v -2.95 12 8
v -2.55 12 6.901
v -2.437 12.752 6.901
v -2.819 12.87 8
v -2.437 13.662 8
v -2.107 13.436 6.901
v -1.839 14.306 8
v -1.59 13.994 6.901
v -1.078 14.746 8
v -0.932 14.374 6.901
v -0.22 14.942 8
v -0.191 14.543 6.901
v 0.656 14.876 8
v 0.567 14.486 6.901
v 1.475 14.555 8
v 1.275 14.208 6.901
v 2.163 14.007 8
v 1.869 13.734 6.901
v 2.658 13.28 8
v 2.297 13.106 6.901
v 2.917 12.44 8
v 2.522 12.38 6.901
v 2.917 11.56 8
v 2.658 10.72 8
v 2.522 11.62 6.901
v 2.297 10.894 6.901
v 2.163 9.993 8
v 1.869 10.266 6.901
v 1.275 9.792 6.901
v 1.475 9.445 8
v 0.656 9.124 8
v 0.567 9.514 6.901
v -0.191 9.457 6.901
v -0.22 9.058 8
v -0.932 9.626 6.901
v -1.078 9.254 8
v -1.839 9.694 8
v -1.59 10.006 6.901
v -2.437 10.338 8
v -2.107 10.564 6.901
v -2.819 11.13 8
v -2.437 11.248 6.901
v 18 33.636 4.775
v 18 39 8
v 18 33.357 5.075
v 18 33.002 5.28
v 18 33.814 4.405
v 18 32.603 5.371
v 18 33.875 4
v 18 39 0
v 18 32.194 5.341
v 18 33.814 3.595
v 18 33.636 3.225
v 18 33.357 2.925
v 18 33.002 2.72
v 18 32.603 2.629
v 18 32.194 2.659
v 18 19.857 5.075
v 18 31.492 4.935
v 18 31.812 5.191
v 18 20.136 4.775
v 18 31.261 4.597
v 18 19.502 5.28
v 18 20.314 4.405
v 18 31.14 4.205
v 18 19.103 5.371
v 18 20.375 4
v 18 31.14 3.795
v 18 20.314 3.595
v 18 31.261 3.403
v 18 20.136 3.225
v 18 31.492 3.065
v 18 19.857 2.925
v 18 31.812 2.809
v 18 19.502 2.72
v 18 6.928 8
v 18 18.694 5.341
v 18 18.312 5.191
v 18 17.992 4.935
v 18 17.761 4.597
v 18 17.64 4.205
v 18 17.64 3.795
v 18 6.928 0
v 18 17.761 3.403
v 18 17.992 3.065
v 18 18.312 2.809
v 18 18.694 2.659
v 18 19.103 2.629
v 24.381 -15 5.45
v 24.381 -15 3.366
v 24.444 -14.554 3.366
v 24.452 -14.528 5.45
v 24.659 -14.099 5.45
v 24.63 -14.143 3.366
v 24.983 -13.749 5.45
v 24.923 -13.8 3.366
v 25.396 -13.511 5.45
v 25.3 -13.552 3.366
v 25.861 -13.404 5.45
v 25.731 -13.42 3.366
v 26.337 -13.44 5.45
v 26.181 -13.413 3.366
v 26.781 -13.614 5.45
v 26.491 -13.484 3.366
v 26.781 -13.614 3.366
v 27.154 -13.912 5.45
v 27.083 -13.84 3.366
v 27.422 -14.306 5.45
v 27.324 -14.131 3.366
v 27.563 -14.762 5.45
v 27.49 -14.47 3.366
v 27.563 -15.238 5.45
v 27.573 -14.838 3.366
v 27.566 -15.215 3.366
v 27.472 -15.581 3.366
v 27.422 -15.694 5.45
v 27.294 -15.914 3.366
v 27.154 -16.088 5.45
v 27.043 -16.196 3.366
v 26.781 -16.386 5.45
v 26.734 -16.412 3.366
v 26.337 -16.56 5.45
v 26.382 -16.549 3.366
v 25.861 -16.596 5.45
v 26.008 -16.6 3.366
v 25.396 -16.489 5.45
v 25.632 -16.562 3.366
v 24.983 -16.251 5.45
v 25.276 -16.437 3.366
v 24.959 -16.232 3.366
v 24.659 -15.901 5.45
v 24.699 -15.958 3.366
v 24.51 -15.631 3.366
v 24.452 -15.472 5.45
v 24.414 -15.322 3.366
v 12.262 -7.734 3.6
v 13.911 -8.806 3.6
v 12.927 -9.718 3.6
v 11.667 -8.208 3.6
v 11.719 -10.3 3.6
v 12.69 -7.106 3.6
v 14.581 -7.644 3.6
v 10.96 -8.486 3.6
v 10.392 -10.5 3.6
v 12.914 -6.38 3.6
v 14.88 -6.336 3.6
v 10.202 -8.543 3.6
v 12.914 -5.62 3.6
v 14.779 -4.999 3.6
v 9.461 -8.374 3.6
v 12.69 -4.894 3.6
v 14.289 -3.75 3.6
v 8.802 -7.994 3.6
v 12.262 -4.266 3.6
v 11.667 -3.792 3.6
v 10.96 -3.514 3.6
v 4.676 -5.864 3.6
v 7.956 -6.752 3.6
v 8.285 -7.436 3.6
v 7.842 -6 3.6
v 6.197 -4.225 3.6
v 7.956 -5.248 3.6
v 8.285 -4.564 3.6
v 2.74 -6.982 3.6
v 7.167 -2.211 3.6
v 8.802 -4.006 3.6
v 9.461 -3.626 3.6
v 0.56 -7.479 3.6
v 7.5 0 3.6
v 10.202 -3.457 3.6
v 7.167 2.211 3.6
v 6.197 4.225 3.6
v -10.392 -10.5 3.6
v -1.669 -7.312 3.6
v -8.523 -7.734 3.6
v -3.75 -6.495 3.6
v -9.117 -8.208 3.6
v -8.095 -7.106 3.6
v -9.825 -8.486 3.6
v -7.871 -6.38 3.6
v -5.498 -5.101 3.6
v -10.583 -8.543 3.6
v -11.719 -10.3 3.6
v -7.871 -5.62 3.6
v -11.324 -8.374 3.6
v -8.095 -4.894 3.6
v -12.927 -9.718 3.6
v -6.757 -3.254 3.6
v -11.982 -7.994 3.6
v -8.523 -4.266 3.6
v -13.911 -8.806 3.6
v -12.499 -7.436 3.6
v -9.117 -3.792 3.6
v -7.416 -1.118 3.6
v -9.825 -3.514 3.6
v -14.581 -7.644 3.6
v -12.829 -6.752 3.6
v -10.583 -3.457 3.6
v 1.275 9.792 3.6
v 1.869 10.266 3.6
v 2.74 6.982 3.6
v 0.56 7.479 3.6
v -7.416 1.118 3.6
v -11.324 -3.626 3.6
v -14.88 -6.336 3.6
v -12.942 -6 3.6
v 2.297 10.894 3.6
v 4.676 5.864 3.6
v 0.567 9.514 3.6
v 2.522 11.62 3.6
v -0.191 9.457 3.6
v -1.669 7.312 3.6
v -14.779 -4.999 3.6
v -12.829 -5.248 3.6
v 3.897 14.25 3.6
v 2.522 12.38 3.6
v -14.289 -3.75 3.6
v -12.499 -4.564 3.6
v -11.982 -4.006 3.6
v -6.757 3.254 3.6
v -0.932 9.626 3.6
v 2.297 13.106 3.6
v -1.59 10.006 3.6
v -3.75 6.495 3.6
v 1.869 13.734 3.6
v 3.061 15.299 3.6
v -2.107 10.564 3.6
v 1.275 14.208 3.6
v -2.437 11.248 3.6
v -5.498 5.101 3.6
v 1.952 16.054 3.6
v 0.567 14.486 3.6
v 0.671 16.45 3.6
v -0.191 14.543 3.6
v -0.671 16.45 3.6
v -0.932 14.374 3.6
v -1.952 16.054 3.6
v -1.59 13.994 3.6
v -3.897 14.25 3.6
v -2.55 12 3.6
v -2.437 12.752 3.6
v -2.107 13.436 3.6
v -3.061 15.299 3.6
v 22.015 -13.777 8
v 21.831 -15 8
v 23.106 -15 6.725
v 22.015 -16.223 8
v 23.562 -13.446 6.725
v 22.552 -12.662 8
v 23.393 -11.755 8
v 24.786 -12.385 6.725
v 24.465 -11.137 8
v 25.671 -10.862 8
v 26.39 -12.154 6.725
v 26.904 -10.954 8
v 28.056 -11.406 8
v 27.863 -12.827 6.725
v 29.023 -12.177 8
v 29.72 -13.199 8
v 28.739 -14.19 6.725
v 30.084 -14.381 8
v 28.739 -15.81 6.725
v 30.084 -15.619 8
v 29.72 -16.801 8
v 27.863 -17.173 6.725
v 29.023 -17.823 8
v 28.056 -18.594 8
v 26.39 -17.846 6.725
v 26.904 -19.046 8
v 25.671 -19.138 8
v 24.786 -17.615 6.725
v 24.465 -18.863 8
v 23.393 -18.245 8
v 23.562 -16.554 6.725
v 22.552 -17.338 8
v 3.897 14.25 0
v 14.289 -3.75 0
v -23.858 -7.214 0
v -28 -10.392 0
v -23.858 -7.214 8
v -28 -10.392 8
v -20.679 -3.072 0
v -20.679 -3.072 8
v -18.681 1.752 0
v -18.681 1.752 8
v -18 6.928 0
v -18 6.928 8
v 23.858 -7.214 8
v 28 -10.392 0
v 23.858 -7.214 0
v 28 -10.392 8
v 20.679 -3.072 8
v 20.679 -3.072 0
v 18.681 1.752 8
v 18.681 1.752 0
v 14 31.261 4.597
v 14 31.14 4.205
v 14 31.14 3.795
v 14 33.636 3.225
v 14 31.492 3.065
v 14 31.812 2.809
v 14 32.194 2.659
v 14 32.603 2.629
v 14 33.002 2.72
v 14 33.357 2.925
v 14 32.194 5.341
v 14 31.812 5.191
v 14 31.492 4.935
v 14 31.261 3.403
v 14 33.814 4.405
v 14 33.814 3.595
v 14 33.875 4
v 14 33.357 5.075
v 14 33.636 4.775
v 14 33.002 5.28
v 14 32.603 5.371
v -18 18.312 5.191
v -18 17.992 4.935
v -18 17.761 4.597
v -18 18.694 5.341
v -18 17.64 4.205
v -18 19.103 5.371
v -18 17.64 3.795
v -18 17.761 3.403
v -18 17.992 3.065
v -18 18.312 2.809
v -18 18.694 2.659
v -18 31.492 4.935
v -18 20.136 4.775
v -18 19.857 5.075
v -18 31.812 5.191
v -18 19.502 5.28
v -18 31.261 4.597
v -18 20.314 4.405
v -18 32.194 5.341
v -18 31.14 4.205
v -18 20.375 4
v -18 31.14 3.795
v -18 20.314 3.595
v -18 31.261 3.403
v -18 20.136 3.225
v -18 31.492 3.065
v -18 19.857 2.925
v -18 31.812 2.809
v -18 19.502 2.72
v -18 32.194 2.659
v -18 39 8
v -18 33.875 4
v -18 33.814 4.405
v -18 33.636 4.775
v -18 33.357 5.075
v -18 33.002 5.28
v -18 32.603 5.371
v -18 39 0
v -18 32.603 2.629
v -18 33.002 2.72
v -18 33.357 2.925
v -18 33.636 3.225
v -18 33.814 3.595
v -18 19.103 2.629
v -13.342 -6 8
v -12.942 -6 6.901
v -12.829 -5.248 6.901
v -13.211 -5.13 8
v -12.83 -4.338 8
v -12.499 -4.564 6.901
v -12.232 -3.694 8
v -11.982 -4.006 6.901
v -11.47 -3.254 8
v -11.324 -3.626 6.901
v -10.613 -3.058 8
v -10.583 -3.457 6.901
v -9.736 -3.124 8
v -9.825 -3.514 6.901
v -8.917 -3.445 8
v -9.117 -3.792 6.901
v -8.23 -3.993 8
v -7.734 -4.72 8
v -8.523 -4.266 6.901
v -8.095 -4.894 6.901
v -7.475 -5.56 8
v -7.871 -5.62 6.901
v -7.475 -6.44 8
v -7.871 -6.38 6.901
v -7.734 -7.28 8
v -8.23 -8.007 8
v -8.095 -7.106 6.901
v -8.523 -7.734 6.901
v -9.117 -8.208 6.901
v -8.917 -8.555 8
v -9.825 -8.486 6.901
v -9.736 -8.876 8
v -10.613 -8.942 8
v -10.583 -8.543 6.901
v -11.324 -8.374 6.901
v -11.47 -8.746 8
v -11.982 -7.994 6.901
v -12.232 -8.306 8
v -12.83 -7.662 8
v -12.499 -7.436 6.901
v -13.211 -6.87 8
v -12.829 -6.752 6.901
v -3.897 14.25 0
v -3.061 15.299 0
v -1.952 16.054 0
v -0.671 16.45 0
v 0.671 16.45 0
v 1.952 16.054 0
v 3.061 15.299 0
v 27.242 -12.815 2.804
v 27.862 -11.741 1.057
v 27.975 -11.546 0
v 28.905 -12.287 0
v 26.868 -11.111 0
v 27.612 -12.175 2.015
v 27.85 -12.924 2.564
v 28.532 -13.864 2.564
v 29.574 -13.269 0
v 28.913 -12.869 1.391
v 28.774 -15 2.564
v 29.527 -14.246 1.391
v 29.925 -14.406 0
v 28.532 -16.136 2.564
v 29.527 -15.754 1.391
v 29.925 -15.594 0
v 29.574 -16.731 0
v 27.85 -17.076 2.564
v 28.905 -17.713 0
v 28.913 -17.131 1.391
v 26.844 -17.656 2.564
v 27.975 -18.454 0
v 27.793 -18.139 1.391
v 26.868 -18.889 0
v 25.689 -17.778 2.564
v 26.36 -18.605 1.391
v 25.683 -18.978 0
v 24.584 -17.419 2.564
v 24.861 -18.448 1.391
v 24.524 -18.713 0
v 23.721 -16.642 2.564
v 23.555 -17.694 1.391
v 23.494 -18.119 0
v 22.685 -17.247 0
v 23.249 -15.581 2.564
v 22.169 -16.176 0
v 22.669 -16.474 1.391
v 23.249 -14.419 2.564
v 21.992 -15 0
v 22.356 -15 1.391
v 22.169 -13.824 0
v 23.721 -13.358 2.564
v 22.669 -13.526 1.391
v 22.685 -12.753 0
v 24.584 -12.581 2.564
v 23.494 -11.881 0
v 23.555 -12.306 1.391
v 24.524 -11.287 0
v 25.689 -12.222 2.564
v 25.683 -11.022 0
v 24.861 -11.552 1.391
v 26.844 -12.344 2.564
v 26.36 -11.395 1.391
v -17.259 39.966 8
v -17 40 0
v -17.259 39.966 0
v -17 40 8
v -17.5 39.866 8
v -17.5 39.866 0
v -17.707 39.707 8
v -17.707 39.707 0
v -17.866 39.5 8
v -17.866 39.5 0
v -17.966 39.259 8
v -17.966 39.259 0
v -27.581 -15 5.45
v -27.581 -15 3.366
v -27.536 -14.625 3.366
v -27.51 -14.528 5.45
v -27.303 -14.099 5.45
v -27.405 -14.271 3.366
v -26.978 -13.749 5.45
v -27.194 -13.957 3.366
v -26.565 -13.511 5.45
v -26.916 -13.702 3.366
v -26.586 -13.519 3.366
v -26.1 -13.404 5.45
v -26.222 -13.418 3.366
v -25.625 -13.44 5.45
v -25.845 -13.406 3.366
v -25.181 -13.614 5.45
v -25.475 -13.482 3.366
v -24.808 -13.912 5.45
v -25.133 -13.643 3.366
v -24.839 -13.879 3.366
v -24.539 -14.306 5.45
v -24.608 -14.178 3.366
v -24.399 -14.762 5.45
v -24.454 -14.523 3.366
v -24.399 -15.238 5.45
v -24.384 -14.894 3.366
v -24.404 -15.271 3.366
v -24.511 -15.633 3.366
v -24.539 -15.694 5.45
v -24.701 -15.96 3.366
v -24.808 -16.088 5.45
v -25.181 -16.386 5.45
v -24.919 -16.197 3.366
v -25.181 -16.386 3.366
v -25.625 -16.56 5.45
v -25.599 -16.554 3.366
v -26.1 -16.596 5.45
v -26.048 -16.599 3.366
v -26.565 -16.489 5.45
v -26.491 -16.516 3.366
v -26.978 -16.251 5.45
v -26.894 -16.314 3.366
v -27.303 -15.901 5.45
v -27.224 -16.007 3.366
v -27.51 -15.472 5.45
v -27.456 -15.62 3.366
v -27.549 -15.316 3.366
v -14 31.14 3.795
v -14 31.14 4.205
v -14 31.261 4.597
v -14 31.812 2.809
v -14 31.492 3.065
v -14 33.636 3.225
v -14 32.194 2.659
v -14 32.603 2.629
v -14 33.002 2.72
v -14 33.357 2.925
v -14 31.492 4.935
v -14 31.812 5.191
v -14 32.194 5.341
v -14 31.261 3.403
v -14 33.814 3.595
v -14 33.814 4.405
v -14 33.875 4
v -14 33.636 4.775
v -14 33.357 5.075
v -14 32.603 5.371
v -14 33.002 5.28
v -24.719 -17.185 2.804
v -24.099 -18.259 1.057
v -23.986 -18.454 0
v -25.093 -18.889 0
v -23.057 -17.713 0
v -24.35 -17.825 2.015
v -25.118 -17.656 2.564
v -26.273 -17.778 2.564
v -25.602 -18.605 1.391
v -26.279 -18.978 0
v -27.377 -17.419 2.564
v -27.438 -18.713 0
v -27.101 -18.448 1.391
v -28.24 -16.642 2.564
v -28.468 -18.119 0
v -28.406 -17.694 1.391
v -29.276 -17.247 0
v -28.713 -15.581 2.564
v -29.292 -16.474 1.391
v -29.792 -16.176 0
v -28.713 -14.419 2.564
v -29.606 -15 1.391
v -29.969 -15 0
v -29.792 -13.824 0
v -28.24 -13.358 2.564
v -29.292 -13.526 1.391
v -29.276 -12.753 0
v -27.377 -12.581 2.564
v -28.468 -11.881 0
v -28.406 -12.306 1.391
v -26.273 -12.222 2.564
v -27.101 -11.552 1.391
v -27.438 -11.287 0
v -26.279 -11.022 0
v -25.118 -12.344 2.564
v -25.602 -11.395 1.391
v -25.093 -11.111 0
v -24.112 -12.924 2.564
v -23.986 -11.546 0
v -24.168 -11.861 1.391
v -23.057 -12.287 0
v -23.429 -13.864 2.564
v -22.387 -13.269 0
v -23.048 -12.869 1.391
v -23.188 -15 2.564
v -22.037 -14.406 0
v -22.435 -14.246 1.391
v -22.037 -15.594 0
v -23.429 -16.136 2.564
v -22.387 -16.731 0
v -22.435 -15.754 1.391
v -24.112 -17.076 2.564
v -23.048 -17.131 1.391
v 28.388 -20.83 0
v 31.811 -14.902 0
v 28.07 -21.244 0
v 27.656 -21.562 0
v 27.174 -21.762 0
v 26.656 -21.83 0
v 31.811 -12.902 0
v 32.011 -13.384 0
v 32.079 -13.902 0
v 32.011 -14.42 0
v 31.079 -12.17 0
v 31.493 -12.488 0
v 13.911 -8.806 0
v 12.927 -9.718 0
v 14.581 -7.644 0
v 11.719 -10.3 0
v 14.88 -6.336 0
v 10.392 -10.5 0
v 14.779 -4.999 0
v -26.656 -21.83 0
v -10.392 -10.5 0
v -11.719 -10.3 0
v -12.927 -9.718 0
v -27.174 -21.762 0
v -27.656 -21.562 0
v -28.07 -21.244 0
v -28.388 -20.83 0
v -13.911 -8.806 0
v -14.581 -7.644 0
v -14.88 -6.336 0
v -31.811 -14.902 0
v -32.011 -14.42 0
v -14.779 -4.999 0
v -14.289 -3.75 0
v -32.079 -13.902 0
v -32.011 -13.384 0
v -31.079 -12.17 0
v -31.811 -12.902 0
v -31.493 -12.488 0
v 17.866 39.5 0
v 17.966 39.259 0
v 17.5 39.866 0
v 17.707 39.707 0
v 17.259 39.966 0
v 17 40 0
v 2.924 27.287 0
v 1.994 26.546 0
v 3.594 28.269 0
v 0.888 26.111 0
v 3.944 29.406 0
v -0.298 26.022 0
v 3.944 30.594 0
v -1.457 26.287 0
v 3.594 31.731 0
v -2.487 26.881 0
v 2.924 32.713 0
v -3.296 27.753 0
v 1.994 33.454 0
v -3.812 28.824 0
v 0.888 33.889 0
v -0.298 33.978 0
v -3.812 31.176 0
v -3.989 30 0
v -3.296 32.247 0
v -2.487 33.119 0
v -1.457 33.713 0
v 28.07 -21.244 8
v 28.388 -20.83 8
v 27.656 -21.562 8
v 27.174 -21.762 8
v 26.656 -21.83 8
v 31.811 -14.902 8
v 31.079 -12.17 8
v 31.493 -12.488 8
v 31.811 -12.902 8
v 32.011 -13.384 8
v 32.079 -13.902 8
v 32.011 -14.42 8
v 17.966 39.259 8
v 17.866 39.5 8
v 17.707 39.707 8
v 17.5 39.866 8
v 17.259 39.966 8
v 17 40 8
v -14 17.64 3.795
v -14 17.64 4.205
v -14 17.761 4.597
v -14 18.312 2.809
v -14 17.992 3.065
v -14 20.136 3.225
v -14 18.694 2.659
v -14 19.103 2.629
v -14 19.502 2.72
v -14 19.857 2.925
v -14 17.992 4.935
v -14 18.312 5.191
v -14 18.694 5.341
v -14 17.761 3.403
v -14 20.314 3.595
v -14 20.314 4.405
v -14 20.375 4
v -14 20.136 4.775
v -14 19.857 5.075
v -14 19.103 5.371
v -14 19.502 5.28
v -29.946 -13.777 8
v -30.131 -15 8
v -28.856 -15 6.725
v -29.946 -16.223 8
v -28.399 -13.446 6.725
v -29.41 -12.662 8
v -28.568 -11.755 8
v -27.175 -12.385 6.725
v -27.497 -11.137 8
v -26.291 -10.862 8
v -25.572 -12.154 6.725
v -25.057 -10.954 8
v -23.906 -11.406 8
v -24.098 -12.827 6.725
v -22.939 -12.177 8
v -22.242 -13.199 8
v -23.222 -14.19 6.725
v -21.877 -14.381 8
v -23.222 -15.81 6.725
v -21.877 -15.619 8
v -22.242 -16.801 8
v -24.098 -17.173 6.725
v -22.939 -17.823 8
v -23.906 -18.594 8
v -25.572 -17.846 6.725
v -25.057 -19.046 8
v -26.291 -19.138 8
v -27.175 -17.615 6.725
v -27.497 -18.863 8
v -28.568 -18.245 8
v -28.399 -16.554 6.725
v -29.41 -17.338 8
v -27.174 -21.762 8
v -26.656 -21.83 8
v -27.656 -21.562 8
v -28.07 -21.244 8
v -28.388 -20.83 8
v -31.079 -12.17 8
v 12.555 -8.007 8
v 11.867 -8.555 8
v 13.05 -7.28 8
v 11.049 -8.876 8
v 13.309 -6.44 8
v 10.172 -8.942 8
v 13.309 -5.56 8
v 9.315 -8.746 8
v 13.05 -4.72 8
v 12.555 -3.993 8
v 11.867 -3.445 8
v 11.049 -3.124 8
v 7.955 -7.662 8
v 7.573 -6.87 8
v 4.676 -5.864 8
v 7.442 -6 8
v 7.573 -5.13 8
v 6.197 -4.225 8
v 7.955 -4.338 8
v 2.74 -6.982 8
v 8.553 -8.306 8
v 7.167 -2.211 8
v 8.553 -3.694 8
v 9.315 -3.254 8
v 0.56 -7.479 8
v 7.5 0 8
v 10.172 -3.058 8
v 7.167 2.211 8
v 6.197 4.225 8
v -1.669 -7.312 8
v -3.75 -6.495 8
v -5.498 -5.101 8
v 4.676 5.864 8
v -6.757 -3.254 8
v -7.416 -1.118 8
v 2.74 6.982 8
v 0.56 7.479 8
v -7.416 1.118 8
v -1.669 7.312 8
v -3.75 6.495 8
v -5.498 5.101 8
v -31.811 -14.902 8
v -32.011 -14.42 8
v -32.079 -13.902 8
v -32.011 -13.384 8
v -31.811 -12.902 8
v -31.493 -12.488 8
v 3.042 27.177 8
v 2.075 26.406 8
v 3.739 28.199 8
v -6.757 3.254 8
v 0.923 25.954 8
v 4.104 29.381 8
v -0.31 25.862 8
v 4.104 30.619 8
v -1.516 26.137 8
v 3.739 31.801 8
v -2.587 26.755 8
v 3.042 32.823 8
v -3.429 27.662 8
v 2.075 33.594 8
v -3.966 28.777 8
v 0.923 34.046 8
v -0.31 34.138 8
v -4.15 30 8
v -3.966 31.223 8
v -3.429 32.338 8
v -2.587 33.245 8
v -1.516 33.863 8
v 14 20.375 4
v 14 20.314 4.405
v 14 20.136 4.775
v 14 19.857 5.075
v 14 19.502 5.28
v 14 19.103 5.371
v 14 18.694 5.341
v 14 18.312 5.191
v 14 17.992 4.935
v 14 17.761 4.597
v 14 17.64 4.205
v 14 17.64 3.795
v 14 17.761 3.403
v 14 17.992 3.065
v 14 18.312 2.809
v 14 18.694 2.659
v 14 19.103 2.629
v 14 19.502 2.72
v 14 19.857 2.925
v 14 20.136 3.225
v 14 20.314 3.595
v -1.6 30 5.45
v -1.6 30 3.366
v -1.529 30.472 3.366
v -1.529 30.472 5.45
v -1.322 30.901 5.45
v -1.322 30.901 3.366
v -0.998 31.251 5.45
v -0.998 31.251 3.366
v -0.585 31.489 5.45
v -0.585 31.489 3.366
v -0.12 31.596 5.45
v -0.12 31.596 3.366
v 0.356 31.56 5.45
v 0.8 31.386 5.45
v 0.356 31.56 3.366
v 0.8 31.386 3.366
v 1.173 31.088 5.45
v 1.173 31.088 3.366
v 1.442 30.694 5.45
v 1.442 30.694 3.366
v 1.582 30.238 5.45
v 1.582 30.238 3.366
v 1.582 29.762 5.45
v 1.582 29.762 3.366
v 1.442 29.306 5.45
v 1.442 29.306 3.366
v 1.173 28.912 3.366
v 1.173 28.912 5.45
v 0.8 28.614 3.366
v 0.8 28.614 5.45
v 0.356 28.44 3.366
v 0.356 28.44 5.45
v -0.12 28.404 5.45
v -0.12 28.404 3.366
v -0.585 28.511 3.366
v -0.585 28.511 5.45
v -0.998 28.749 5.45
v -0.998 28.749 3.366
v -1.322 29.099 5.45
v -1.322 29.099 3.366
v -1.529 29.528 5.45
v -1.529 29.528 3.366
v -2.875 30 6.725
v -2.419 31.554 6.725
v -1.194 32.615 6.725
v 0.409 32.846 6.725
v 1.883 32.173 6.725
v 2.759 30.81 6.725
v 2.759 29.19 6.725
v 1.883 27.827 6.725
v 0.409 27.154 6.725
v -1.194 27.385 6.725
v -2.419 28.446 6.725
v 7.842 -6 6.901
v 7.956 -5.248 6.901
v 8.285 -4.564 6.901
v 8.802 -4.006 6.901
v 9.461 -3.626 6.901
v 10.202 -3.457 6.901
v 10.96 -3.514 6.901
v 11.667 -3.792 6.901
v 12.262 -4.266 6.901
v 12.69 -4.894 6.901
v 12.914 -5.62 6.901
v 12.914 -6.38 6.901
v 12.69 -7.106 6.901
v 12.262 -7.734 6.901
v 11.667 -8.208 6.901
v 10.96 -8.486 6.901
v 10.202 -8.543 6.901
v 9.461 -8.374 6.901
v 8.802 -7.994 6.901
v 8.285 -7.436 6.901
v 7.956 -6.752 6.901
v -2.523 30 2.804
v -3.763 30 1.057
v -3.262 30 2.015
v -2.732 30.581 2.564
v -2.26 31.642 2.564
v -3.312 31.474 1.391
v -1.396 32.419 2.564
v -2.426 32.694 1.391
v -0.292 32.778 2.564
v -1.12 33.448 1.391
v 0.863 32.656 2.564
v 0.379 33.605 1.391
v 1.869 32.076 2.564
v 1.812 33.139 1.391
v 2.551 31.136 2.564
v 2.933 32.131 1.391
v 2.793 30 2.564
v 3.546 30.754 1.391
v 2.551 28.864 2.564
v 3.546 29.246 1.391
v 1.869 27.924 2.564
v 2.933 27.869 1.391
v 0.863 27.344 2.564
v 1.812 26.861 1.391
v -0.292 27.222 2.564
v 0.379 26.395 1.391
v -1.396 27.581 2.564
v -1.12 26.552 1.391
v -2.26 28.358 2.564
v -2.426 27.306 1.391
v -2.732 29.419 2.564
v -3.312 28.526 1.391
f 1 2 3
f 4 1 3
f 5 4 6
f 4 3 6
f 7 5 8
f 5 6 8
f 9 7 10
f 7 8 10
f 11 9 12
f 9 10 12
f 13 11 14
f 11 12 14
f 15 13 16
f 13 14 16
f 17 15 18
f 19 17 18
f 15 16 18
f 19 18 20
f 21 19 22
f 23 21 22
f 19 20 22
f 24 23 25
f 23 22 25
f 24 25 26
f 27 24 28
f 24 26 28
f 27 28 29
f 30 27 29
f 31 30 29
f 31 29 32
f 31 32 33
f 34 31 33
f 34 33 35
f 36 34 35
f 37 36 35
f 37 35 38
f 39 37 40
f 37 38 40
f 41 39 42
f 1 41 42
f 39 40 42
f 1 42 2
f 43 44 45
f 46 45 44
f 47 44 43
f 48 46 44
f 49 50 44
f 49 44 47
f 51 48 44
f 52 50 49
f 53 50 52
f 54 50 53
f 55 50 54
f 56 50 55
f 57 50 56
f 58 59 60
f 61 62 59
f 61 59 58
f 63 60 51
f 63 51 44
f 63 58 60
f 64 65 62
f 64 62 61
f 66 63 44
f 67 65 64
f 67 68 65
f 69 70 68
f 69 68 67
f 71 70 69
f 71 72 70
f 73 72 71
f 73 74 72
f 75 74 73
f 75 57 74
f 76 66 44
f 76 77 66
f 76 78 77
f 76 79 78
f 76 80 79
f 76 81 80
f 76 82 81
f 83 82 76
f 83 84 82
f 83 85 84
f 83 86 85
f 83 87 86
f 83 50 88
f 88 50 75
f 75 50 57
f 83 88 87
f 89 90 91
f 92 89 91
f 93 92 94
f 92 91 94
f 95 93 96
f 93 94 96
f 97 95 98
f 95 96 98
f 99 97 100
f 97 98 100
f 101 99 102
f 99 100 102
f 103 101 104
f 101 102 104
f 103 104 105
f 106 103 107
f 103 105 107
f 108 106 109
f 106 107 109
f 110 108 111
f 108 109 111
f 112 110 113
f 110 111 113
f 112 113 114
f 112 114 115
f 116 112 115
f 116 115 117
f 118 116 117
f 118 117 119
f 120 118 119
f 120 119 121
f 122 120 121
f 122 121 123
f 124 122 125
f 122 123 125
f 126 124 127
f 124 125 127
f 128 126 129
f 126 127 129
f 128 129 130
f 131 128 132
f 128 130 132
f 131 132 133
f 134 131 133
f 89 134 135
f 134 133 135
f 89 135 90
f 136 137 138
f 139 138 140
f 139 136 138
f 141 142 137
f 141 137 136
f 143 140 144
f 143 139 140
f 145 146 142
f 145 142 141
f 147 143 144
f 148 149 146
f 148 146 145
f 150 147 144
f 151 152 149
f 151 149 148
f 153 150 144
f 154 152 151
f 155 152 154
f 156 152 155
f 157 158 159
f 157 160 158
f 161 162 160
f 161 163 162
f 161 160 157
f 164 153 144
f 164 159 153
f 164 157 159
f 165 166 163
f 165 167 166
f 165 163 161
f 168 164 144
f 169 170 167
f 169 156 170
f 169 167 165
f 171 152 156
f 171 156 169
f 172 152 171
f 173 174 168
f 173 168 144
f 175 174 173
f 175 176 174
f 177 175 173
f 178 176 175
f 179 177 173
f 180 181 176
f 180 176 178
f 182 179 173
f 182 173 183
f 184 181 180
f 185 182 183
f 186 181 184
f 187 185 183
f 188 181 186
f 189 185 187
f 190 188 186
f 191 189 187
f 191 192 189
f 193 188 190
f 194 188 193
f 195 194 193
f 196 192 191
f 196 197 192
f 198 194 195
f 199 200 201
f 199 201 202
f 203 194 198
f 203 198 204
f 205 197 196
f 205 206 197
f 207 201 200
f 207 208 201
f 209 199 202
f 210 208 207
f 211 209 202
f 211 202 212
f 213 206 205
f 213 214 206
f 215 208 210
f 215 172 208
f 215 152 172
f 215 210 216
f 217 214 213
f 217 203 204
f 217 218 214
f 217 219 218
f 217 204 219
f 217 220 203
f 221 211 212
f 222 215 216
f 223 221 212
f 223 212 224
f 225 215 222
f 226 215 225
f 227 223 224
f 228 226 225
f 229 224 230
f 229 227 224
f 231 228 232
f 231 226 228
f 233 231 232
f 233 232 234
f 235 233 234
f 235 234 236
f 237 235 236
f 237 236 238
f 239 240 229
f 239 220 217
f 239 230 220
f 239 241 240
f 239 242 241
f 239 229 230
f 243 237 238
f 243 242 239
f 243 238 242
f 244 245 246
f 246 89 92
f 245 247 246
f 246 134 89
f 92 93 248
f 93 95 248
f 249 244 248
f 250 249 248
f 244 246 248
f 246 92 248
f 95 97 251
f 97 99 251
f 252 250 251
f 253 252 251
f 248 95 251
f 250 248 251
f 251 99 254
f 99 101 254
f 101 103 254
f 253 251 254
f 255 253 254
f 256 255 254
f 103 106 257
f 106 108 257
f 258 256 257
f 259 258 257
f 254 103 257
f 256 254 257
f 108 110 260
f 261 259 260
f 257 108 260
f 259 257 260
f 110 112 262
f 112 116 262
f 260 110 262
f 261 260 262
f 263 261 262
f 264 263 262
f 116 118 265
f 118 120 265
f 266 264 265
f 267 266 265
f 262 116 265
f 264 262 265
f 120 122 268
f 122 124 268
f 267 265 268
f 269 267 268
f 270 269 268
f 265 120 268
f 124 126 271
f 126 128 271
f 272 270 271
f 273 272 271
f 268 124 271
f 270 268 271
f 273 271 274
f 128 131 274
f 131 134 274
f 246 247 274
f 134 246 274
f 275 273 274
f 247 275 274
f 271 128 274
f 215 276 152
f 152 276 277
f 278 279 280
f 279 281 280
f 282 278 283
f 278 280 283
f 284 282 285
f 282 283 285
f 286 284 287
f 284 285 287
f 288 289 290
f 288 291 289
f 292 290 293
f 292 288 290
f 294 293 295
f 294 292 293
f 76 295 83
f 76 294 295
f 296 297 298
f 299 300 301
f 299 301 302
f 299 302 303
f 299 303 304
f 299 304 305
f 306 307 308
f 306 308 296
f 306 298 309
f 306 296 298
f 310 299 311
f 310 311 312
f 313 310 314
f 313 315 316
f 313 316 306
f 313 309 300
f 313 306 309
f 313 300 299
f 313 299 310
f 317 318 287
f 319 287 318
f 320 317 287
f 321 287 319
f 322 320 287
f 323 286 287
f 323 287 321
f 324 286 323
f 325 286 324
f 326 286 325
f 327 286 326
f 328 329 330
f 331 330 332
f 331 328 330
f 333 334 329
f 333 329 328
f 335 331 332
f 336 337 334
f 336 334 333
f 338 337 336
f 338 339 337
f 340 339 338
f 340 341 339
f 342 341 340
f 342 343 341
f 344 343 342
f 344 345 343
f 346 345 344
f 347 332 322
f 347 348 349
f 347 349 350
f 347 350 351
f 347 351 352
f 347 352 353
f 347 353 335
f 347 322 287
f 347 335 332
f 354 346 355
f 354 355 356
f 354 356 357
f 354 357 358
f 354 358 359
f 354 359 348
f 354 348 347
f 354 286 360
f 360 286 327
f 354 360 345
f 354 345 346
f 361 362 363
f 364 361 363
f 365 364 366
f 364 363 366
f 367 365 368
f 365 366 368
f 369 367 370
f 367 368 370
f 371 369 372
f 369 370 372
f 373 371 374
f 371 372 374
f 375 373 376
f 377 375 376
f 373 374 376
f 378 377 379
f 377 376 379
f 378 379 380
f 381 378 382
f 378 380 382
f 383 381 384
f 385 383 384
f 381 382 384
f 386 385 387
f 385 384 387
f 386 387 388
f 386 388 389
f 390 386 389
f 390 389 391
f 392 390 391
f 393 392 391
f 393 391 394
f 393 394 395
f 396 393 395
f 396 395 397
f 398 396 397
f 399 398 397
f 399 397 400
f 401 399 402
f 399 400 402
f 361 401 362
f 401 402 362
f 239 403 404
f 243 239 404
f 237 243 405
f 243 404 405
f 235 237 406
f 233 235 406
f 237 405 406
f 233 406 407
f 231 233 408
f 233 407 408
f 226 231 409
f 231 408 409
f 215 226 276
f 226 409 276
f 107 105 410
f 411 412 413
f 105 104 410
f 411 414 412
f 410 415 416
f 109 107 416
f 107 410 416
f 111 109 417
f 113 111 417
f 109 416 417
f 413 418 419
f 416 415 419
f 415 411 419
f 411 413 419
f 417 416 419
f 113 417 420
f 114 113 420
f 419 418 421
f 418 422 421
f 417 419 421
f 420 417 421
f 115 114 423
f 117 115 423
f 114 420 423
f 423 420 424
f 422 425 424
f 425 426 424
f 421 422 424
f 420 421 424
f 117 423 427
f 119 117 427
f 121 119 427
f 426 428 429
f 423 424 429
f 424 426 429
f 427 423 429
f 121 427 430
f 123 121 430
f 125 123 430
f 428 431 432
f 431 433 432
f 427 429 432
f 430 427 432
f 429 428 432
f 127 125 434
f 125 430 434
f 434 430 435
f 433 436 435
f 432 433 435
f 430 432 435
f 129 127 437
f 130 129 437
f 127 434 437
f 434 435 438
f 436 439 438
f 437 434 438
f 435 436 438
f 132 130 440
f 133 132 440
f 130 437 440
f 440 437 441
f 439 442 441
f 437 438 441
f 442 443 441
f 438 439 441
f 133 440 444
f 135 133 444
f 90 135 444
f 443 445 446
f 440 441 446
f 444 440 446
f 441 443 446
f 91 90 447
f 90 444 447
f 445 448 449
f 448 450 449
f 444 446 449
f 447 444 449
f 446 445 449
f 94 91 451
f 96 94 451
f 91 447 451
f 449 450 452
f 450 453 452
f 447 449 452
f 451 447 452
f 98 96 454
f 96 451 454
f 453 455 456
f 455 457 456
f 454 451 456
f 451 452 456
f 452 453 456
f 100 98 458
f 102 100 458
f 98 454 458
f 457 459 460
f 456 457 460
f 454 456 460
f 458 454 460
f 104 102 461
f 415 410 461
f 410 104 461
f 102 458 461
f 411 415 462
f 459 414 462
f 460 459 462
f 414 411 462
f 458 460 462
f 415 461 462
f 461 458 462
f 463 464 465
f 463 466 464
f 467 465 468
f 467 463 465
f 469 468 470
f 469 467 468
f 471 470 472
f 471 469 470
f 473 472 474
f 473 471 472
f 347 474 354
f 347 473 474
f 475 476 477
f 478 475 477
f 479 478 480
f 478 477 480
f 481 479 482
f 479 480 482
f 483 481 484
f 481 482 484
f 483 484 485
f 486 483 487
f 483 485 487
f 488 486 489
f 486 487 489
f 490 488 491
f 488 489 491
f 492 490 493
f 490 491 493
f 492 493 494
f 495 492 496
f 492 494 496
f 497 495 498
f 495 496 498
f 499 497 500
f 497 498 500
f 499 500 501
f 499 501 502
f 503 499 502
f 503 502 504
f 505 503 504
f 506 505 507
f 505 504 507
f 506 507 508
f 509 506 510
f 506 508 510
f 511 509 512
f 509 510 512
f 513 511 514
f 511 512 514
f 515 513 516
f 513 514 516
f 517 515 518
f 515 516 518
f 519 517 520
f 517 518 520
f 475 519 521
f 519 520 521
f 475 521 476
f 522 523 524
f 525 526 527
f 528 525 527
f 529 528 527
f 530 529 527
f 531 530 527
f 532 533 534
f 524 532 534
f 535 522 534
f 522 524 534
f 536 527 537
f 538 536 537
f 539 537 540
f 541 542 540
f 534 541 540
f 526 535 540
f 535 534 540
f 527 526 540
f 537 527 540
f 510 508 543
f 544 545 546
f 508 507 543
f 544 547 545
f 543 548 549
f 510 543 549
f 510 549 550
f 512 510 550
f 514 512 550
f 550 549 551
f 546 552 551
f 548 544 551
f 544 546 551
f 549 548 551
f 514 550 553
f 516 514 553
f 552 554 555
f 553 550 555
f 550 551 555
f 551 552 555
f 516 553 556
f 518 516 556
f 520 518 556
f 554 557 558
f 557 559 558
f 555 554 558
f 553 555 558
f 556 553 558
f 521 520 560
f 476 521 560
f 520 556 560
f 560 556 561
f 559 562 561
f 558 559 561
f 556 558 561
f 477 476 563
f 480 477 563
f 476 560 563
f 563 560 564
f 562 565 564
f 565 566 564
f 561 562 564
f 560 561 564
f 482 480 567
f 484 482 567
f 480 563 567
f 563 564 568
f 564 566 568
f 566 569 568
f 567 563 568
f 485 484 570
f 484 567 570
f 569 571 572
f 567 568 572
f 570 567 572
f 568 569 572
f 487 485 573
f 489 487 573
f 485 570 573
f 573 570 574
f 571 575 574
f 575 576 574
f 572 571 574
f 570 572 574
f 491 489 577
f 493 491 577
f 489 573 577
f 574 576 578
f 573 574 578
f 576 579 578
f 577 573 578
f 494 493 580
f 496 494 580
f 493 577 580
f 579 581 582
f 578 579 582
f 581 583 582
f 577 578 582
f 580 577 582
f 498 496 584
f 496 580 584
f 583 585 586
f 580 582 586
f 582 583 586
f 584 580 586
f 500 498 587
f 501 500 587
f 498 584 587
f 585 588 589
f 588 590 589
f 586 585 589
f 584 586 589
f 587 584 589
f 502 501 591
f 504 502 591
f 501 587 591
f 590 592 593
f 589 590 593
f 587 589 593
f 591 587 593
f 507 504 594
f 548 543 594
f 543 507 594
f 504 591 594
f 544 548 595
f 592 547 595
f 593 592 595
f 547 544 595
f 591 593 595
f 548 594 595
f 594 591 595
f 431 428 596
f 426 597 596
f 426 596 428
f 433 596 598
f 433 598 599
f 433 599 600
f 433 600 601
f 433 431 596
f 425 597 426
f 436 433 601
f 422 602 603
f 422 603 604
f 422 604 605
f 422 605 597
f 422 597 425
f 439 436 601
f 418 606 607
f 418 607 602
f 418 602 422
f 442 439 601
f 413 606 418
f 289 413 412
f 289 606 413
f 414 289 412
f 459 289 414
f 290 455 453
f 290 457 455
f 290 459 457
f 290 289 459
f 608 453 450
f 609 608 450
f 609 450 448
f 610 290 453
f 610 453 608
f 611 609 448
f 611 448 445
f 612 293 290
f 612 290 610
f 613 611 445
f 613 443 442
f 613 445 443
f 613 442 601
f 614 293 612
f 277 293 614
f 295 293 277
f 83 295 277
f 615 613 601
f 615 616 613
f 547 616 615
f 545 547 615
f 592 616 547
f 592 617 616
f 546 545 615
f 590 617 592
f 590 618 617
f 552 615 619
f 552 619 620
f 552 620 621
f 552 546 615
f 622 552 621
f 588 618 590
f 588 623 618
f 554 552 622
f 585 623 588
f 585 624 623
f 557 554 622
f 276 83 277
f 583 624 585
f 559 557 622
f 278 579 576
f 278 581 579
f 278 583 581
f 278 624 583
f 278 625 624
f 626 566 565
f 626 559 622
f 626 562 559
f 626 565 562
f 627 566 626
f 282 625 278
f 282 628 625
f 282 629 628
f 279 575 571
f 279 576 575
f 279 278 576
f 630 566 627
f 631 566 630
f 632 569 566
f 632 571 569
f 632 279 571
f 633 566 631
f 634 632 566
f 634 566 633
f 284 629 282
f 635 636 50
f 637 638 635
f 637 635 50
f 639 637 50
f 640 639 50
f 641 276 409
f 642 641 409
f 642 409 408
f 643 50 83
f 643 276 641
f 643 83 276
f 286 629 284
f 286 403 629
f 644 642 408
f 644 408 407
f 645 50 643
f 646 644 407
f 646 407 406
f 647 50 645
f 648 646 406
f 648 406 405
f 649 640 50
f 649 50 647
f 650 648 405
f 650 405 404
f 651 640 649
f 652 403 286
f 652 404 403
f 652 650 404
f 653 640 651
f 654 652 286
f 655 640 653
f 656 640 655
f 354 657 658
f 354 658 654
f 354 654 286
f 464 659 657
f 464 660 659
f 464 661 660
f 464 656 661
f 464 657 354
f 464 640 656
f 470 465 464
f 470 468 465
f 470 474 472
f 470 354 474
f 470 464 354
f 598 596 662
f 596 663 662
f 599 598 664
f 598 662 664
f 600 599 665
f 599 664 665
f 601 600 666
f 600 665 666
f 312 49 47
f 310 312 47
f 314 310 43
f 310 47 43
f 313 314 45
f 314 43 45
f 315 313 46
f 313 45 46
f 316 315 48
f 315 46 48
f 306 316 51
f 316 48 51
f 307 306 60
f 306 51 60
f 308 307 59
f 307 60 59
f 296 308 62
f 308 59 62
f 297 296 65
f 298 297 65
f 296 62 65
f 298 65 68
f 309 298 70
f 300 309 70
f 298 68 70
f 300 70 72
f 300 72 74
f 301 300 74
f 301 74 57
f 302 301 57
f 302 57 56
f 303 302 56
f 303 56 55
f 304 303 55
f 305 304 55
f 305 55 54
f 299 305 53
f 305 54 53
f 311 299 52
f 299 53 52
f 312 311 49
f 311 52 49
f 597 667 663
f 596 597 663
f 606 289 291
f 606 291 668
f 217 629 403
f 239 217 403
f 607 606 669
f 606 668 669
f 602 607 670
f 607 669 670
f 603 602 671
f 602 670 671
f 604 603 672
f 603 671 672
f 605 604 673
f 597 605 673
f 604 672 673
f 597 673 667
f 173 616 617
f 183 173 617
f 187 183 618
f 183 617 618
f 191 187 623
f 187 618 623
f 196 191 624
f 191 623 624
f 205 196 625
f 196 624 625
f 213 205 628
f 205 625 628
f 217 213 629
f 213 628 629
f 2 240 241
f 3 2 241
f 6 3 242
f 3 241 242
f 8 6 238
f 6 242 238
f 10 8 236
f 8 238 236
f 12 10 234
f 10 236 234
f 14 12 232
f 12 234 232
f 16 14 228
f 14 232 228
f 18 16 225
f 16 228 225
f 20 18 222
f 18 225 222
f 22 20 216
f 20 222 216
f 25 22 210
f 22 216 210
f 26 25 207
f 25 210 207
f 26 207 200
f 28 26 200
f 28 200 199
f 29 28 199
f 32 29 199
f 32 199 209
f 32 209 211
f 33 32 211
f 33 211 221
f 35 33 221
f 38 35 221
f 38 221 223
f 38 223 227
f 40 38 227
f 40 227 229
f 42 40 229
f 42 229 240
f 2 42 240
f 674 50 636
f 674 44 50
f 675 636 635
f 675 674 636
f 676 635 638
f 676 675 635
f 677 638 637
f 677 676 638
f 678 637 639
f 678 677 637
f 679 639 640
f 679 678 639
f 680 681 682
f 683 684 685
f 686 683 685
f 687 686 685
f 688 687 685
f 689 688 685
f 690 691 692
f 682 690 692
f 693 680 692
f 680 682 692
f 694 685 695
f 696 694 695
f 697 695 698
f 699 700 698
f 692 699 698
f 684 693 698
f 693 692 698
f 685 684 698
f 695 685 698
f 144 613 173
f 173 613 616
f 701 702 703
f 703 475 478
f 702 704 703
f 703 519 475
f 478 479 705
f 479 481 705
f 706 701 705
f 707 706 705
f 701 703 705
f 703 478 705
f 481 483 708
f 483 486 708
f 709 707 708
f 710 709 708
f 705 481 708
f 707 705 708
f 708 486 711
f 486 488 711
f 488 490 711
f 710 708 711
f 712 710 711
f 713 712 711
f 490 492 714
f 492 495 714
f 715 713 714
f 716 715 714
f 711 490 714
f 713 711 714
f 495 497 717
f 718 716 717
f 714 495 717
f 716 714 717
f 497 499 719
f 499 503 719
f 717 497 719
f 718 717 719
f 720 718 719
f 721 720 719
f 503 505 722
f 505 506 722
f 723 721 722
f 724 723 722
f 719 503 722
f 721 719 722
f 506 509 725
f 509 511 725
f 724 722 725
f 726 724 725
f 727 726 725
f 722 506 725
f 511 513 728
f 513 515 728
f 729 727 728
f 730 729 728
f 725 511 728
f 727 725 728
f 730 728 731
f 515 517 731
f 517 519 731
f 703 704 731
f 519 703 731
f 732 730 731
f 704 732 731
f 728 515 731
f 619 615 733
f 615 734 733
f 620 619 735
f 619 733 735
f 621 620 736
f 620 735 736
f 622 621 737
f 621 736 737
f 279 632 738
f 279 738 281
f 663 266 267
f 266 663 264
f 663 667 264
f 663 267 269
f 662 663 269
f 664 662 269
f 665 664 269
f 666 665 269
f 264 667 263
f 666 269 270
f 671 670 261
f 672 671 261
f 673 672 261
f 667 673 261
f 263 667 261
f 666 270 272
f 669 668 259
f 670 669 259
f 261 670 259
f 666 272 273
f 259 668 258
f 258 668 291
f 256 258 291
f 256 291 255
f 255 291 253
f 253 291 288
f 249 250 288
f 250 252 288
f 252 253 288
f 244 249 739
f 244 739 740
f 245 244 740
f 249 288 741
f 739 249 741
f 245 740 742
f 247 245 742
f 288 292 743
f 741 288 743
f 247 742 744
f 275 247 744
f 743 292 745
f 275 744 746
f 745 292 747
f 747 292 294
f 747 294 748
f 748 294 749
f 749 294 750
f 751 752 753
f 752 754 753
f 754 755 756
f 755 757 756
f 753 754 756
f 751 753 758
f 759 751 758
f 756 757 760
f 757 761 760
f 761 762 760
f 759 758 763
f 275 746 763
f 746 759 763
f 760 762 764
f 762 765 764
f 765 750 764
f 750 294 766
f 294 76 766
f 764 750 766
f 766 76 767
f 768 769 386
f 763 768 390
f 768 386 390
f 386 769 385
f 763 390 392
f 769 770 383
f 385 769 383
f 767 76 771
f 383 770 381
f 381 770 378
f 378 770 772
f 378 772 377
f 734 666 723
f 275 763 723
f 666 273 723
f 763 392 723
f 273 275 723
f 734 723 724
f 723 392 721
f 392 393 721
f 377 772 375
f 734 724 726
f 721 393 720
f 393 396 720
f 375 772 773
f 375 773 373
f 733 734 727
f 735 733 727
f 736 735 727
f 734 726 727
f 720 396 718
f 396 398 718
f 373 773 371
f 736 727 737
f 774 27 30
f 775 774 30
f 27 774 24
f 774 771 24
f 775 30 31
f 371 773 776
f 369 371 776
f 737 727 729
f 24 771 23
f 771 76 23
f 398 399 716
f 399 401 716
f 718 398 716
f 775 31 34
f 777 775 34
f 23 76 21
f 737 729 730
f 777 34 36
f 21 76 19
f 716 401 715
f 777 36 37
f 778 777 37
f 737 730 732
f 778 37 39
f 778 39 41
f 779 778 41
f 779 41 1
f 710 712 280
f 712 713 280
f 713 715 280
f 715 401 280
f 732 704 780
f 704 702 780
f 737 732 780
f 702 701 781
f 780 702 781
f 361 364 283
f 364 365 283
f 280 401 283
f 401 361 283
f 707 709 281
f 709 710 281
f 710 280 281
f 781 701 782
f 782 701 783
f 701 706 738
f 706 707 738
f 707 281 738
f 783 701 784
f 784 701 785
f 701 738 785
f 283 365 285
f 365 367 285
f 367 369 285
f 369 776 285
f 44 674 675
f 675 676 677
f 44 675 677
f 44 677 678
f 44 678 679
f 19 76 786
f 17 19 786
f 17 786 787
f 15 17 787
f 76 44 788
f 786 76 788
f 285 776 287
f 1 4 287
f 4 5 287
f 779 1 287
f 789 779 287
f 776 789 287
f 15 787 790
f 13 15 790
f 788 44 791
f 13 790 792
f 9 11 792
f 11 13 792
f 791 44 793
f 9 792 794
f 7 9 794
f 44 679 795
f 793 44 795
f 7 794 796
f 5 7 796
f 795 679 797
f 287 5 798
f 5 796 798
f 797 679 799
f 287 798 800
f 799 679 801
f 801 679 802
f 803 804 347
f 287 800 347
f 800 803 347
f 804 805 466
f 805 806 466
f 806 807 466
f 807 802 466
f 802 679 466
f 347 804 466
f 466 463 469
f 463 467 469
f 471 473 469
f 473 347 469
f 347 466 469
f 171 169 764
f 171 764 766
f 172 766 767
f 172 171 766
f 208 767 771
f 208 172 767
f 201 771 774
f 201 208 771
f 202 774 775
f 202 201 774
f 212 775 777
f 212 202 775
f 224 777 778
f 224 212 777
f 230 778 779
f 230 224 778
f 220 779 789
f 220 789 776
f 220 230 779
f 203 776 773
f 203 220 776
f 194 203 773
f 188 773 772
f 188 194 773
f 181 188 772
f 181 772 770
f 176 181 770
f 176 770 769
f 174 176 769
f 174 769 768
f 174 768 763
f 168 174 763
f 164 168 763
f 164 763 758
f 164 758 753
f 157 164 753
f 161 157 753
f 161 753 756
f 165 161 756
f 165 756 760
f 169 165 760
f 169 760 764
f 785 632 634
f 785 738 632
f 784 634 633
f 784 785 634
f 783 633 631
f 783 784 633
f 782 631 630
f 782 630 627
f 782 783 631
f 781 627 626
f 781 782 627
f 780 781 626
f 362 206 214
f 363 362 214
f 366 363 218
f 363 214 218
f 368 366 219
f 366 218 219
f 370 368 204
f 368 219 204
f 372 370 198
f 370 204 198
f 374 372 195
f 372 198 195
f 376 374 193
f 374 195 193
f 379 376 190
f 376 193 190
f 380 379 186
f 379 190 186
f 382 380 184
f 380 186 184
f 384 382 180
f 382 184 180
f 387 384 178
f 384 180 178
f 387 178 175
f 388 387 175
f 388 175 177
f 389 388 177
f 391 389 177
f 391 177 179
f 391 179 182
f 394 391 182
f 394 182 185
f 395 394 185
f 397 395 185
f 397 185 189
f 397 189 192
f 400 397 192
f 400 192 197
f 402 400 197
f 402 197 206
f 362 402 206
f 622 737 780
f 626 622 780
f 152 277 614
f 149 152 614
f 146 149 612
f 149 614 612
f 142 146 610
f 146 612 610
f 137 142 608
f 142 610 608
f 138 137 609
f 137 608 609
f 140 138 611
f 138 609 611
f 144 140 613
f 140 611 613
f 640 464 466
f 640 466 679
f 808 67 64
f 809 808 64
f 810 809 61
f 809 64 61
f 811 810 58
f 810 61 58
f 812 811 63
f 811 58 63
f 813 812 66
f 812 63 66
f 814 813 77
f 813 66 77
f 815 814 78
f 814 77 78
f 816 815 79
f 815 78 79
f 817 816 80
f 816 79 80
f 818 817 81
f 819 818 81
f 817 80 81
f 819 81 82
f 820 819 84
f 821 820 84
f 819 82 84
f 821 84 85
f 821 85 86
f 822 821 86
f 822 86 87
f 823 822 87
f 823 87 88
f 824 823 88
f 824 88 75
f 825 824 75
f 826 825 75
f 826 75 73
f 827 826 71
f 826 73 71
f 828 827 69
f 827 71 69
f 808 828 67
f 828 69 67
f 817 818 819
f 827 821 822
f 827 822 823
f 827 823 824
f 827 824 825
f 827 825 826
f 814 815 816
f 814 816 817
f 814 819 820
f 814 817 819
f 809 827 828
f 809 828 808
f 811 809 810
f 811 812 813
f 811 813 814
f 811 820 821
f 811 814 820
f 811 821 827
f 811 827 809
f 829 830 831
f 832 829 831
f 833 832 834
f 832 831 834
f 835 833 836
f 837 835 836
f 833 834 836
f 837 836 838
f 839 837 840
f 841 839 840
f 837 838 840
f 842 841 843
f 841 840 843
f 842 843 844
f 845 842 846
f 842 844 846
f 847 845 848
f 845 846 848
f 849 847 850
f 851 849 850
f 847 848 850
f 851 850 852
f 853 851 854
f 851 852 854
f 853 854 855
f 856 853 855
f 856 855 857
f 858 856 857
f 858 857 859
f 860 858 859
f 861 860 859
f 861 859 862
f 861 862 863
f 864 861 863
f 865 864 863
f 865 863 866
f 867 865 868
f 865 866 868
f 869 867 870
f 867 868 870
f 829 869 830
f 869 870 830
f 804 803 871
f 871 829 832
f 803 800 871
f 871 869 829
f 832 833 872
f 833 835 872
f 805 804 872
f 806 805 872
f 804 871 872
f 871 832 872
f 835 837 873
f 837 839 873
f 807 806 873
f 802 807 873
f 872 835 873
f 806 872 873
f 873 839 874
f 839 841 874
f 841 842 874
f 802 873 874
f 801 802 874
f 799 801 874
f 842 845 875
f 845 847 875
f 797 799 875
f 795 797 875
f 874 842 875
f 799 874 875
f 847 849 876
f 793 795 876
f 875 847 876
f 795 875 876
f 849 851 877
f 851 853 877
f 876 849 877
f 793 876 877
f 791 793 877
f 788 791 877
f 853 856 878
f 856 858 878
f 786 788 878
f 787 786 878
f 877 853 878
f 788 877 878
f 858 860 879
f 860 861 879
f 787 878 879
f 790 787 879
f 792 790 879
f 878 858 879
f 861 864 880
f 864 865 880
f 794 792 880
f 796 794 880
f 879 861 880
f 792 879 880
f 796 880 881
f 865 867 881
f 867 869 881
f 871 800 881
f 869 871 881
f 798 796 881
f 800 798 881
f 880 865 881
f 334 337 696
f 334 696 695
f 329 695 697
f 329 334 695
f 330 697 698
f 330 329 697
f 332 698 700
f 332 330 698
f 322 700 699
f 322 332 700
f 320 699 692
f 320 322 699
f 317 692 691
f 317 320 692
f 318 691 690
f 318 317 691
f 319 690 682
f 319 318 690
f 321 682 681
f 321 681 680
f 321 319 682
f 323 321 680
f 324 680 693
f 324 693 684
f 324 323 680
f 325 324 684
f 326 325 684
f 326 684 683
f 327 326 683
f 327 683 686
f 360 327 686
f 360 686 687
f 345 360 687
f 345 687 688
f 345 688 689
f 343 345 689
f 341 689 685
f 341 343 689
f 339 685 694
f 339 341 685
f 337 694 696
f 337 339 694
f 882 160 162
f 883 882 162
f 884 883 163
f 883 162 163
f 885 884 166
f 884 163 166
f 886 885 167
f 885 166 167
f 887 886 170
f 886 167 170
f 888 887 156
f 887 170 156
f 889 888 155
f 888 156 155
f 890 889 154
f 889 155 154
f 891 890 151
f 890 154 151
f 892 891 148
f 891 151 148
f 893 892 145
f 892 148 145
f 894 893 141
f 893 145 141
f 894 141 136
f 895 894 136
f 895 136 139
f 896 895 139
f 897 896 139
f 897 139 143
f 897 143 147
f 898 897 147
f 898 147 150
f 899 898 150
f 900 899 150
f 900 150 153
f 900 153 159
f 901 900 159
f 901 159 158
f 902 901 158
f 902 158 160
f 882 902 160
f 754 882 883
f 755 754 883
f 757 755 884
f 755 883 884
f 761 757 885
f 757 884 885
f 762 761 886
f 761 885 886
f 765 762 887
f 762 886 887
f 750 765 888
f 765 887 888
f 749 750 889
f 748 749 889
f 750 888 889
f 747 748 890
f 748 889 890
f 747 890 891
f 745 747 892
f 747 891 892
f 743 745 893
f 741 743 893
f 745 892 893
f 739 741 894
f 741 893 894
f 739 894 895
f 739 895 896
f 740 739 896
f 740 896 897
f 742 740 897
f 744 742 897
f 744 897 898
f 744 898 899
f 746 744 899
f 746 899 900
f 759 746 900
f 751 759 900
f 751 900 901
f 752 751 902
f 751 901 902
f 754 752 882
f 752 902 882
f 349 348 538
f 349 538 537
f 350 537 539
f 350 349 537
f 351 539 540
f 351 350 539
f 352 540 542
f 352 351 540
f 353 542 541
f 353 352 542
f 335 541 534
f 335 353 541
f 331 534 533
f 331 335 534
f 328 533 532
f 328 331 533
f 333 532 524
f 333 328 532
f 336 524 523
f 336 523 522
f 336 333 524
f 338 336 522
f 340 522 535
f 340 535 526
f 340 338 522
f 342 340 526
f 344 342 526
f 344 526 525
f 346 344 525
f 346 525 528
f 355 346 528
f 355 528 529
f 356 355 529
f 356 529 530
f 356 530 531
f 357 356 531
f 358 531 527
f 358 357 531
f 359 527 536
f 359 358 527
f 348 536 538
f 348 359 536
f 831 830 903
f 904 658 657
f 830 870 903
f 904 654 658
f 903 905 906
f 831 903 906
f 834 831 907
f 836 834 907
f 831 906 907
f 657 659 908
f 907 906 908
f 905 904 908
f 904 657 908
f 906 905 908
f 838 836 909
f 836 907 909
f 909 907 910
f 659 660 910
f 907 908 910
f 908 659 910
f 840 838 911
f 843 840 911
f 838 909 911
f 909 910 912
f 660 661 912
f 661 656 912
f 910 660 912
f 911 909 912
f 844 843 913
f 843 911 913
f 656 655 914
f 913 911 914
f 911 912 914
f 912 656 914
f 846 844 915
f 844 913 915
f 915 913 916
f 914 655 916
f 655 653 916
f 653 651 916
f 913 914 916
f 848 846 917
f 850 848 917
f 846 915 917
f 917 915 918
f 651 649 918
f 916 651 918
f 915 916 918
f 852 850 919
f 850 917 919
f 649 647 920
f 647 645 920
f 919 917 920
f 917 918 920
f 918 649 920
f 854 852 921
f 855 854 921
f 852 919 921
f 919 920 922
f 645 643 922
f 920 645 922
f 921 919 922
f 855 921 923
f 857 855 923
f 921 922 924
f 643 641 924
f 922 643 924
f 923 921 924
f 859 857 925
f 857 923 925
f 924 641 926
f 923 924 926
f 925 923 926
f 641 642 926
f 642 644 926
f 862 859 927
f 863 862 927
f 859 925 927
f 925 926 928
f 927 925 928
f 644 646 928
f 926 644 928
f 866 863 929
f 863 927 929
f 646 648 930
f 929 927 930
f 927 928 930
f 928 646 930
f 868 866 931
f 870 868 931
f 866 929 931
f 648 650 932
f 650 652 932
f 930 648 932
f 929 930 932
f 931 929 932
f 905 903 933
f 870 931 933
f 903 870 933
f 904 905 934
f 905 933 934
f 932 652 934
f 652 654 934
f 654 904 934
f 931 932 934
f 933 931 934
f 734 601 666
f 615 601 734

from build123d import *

# Parameters (mm, degrees)
SKETCH2_R                                       = 7.5
BOSS_EXTRUDE1_DEPTH                             = 8
CSK_FOR_M3_FLAT_HEAD_MACHINE_SCREW2_D           = 3.2
CSK_FOR_M3_FLAT_HEAD_MACHINE_SCREW2_CSINK_D     = 8.3
CSK_FOR_M3_FLAT_HEAD_MACHINE_SCREW2_CSINK_ANGLE = 90
FILLET1_R                                       = 20
V_GROOVE_CUTOUT_FLIPPED_DEPTH                   = 3.6
SKETCH49_R                                      = 2.55
CUT_EXTRUDE3_DEPTH                              = 52.922196079
CHAMFER2_SIZE                                   = 0.4
CHAMFER2_SIZE2                                  = 1.098990968
MOVE_FACE2_BY                                   = 0.5
MOVE_FACE2_2_BY                                 = 0.5
MOVE_FACE2_3_BY                                 = 0.5
MOVE_FACE2_4_BY                                 = 0.5
MOVE_FACE2_5_BY                                 = 0.5
MOVE_FACE2_6_BY                                 = 0.5
CIRPATTERN2_COUNT                               = 3
SKETCH20_R                                      = 1.375
TOOL_WING_SCREW_HOLES_DEPTH                     = 4
FILLET17_R                                      = 2
FILLET18_R                                      = 1


with BuildPart() as part:
    # Sketch2 → Boss-Extrude1 (new body)
    with BuildSketch(Plane.XY):
        Polygon((-18, 40), (18, 40), (18, -4.618802154), (32.810889132, -13.169872981), (27.810889132, -21.830127019), (-27.810889132, -21.830127019), (-32.810889132, -13.169872981), (-18, -4.618802154), align=None)
        Circle(SKETCH2_R, mode=Mode.SUBTRACT)
    extrude(amount=BOSS_EXTRUDE1_DEPTH)

    # CSK for M3 Flat Head Machine Screw2 (through all)
    with Locations(Plane.XY.offset(8)):
        with Locations((-25.980762114, -15), (0, 30), (25.980762114, -15)):
            CounterSinkHole(CSK_FOR_M3_FLAT_HEAD_MACHINE_SCREW2_D / 2, CSK_FOR_M3_FLAT_HEAD_MACHINE_SCREW2_CSINK_D / 2, counter_sink_angle=CSK_FOR_M3_FLAT_HEAD_MACHINE_SCREW2_CSINK_ANGLE)

    # Fillet1
    fillet1_edges = [part.edges().sort_by_distance(p)[0] for p in [
        (18, -4.618802154, 4),
        (-18, -4.618802154, 4),
    ]]
    fillet(fillet1_edges, radius=FILLET1_R)

    # Sketch47 → v-groove cutout flipped (cut)
    with BuildSketch(Plane(origin=(0, 0, 0), x_dir=(-1, 0, 0), z_dir=(0, 0, -1))):
        with BuildLine():
            Line((-3.464101615, 14), (-13.856406461, -4))
            ThreePointArc((-13.856406461, -4), (-13.856406461, -8), (-10.392304845, -10))
            Line((-10.392304845, -10), (10.392304845, -10))
            ThreePointArc((10.392304845, -10), (13.856406461, -8), (13.856406461, -4))
            Line((13.856406461, -4), (3.464101615, 14))
            ThreePointArc((3.464101615, 14), (0, 16), (-3.464101615, 14))
        make_face()
    extrude(amount=-V_GROOVE_CUTOUT_FLIPPED_DEPTH, mode=Mode.SUBTRACT)

    # Sketch49 → Cut-Extrude3 (cut, through all)
    with BuildSketch(Plane(origin=(0, 0, 3.6), x_dir=(-1, 0, 0), z_dir=(0, 0, -1))):
        with Locations((0, 12)):
            Circle(SKETCH49_R)
        with Locations((10.392304845, -6)):
            Circle(SKETCH49_R)
        with Locations((-10.392304845, -6)):
            Circle(SKETCH49_R)
    extrude(amount=-CUT_EXTRUDE3_DEPTH, mode=Mode.SUBTRACT)

    # Chamfer2
    chamfer2_edges = [part.edges().sort_by_distance(p)[0] for p in [
        (2.55, 12, 8),
        (-7.842304845, -6, 8),
        (12.942304845, -6, 8),
    ]]
    chamfer2_side = [part.faces().sort_by_distance(p)[0] for p in [
        (17.098380214, 23.464101615, 8),
    ]]
    chamfer(chamfer2_edges, length=CHAMFER2_SIZE, length2=CHAMFER2_SIZE2, reference=chamfer2_side[0])

    # Move Face2: a curved face moved inward by 0.5
    add(Solid.thicken(part.faces().sort_by_distance((-13.856406461, -8, 1.8))[0], -MOVE_FACE2_BY), mode=Mode.SUBTRACT)

    # Move Face2 2: a face moved inward by 0.5
    extrude(part.faces().sort_by_distance((0, -10, 1.8))[0], amount=MOVE_FACE2_2_BY, dir=(0, -1, 0), mode=Mode.SUBTRACT)

    # Move Face2 3: a curved face moved inward by 0.5
    add(Solid.thicken(part.faces().sort_by_distance((13.856406461, -8, 1.8))[0], -MOVE_FACE2_3_BY), mode=Mode.SUBTRACT)

    # Move Face2 4: a face moved inward by 0.5
    extrude(part.faces().sort_by_distance((8.660254038, 5, 1.8))[0], amount=MOVE_FACE2_4_BY, dir=(0.866025404, 0.5, 0), mode=Mode.SUBTRACT)

    # Move Face2 5: a curved face moved inward by 0.5
    add(Solid.thicken(part.faces().sort_by_distance((0, 16, 1.8))[0], -MOVE_FACE2_5_BY), mode=Mode.SUBTRACT)

    # Move Face2 6: a face moved inward by 0.5
    extrude(part.faces().sort_by_distance((-8.660254038, 5, 1.8))[0], amount=MOVE_FACE2_6_BY, dir=(-0.866025404, 0.5, 0), mode=Mode.SUBTRACT)

    # Sketch46 → tool ball cutout (revolve, cut)
    with BuildSketch(Plane(origin=(0, 30, 0), x_dir=(1, 0, 0), z_dir=(0, 1, 0))):
        with BuildLine():
            Line((0, 4.3), (0, -3.7))
            ThreePointArc((0, -3.7), (-4, 0.3), (0, 4.3))
        make_face()
    tool_ball_cutout = revolve(axis=Axis((0, 30, 0), (0, 0, -1)), mode=Mode.SUBTRACT)

    # CirPattern2: tool ball cutout ×3 about axis
    cirpattern2_axis = Axis((0, 0, 0), (0, 0, 1))
    for i in range(1, CIRPATTERN2_COUNT):
        add(tool_ball_cutout.rotate(cirpattern2_axis, i * 360 / CIRPATTERN2_COUNT), mode=Mode.SUBTRACT)

    # Sketch20 → Tool Wing Screw Holes (cut)
    with BuildSketch(Plane(origin=(18, 0, 0), x_dir=(0, 0, -1), z_dir=(1, 0, 0))):
        with Locations(Location((-4, 19, 0), (0, 0, 90))):
            Circle(SKETCH20_R)
        with Locations(Location((-4, 32.5, 0), (0, 0, 90))):
            Circle(SKETCH20_R)
    tool_wing_screw_holes = extrude(amount=-TOOL_WING_SCREW_HOLES_DEPTH, mode=Mode.SUBTRACT)

    # Mirror2: Tool Wing Screw Holes across plane
    add(tool_wing_screw_holes.mirror(Plane(origin=(0, 0, 0), x_dir=(0, 0, 1), z_dir=(1, 0, 0))), mode=Mode.SUBTRACT)

    # Fillet17
    fillet17_edges = [part.edges().sort_by_distance(p)[0] for p in [
        (32.810889132, -13.169872981, 4),
        (27.810889132, -21.830127019, 4),
        (-27.810889132, -21.830127019, 4),
        (-32.810889132, -13.169872981, 4),
    ]]
    fillet(fillet17_edges, radius=FILLET17_R)

    # Fillet18
    fillet18_edges = [part.edges().sort_by_distance(p)[0] for p in [
        (-18, 40, 4),
        (18, 40, 4),
    ]]
    fillet(fillet18_edges, radius=FILLET18_R)


solid = part.part
